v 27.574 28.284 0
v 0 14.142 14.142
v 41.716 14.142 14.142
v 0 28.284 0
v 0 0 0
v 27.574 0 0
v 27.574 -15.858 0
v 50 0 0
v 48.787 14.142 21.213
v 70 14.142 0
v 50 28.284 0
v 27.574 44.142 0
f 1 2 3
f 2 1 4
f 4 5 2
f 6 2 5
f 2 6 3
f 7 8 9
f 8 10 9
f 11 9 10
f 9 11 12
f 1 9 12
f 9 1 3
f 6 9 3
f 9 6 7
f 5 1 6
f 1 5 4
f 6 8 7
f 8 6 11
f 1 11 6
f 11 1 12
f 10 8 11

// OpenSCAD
intersection() {
	union() {
		rotate([-45, 0, 0]) {
			cube([50, 20, 20]);
		}
		translate([70, 20 / sqrt(2),0]) {
			mirror([1, 0, 0]) {
				rotate([90, 45, 0]) {
					rotate([0, 45, 0]) {
						cube([60, 30, 60]);
					}
				}
			}
		}
	}
	translate([0, -50, 0]) { //Whole arrow.
		cube([100, 100, 100]);
	}
}
